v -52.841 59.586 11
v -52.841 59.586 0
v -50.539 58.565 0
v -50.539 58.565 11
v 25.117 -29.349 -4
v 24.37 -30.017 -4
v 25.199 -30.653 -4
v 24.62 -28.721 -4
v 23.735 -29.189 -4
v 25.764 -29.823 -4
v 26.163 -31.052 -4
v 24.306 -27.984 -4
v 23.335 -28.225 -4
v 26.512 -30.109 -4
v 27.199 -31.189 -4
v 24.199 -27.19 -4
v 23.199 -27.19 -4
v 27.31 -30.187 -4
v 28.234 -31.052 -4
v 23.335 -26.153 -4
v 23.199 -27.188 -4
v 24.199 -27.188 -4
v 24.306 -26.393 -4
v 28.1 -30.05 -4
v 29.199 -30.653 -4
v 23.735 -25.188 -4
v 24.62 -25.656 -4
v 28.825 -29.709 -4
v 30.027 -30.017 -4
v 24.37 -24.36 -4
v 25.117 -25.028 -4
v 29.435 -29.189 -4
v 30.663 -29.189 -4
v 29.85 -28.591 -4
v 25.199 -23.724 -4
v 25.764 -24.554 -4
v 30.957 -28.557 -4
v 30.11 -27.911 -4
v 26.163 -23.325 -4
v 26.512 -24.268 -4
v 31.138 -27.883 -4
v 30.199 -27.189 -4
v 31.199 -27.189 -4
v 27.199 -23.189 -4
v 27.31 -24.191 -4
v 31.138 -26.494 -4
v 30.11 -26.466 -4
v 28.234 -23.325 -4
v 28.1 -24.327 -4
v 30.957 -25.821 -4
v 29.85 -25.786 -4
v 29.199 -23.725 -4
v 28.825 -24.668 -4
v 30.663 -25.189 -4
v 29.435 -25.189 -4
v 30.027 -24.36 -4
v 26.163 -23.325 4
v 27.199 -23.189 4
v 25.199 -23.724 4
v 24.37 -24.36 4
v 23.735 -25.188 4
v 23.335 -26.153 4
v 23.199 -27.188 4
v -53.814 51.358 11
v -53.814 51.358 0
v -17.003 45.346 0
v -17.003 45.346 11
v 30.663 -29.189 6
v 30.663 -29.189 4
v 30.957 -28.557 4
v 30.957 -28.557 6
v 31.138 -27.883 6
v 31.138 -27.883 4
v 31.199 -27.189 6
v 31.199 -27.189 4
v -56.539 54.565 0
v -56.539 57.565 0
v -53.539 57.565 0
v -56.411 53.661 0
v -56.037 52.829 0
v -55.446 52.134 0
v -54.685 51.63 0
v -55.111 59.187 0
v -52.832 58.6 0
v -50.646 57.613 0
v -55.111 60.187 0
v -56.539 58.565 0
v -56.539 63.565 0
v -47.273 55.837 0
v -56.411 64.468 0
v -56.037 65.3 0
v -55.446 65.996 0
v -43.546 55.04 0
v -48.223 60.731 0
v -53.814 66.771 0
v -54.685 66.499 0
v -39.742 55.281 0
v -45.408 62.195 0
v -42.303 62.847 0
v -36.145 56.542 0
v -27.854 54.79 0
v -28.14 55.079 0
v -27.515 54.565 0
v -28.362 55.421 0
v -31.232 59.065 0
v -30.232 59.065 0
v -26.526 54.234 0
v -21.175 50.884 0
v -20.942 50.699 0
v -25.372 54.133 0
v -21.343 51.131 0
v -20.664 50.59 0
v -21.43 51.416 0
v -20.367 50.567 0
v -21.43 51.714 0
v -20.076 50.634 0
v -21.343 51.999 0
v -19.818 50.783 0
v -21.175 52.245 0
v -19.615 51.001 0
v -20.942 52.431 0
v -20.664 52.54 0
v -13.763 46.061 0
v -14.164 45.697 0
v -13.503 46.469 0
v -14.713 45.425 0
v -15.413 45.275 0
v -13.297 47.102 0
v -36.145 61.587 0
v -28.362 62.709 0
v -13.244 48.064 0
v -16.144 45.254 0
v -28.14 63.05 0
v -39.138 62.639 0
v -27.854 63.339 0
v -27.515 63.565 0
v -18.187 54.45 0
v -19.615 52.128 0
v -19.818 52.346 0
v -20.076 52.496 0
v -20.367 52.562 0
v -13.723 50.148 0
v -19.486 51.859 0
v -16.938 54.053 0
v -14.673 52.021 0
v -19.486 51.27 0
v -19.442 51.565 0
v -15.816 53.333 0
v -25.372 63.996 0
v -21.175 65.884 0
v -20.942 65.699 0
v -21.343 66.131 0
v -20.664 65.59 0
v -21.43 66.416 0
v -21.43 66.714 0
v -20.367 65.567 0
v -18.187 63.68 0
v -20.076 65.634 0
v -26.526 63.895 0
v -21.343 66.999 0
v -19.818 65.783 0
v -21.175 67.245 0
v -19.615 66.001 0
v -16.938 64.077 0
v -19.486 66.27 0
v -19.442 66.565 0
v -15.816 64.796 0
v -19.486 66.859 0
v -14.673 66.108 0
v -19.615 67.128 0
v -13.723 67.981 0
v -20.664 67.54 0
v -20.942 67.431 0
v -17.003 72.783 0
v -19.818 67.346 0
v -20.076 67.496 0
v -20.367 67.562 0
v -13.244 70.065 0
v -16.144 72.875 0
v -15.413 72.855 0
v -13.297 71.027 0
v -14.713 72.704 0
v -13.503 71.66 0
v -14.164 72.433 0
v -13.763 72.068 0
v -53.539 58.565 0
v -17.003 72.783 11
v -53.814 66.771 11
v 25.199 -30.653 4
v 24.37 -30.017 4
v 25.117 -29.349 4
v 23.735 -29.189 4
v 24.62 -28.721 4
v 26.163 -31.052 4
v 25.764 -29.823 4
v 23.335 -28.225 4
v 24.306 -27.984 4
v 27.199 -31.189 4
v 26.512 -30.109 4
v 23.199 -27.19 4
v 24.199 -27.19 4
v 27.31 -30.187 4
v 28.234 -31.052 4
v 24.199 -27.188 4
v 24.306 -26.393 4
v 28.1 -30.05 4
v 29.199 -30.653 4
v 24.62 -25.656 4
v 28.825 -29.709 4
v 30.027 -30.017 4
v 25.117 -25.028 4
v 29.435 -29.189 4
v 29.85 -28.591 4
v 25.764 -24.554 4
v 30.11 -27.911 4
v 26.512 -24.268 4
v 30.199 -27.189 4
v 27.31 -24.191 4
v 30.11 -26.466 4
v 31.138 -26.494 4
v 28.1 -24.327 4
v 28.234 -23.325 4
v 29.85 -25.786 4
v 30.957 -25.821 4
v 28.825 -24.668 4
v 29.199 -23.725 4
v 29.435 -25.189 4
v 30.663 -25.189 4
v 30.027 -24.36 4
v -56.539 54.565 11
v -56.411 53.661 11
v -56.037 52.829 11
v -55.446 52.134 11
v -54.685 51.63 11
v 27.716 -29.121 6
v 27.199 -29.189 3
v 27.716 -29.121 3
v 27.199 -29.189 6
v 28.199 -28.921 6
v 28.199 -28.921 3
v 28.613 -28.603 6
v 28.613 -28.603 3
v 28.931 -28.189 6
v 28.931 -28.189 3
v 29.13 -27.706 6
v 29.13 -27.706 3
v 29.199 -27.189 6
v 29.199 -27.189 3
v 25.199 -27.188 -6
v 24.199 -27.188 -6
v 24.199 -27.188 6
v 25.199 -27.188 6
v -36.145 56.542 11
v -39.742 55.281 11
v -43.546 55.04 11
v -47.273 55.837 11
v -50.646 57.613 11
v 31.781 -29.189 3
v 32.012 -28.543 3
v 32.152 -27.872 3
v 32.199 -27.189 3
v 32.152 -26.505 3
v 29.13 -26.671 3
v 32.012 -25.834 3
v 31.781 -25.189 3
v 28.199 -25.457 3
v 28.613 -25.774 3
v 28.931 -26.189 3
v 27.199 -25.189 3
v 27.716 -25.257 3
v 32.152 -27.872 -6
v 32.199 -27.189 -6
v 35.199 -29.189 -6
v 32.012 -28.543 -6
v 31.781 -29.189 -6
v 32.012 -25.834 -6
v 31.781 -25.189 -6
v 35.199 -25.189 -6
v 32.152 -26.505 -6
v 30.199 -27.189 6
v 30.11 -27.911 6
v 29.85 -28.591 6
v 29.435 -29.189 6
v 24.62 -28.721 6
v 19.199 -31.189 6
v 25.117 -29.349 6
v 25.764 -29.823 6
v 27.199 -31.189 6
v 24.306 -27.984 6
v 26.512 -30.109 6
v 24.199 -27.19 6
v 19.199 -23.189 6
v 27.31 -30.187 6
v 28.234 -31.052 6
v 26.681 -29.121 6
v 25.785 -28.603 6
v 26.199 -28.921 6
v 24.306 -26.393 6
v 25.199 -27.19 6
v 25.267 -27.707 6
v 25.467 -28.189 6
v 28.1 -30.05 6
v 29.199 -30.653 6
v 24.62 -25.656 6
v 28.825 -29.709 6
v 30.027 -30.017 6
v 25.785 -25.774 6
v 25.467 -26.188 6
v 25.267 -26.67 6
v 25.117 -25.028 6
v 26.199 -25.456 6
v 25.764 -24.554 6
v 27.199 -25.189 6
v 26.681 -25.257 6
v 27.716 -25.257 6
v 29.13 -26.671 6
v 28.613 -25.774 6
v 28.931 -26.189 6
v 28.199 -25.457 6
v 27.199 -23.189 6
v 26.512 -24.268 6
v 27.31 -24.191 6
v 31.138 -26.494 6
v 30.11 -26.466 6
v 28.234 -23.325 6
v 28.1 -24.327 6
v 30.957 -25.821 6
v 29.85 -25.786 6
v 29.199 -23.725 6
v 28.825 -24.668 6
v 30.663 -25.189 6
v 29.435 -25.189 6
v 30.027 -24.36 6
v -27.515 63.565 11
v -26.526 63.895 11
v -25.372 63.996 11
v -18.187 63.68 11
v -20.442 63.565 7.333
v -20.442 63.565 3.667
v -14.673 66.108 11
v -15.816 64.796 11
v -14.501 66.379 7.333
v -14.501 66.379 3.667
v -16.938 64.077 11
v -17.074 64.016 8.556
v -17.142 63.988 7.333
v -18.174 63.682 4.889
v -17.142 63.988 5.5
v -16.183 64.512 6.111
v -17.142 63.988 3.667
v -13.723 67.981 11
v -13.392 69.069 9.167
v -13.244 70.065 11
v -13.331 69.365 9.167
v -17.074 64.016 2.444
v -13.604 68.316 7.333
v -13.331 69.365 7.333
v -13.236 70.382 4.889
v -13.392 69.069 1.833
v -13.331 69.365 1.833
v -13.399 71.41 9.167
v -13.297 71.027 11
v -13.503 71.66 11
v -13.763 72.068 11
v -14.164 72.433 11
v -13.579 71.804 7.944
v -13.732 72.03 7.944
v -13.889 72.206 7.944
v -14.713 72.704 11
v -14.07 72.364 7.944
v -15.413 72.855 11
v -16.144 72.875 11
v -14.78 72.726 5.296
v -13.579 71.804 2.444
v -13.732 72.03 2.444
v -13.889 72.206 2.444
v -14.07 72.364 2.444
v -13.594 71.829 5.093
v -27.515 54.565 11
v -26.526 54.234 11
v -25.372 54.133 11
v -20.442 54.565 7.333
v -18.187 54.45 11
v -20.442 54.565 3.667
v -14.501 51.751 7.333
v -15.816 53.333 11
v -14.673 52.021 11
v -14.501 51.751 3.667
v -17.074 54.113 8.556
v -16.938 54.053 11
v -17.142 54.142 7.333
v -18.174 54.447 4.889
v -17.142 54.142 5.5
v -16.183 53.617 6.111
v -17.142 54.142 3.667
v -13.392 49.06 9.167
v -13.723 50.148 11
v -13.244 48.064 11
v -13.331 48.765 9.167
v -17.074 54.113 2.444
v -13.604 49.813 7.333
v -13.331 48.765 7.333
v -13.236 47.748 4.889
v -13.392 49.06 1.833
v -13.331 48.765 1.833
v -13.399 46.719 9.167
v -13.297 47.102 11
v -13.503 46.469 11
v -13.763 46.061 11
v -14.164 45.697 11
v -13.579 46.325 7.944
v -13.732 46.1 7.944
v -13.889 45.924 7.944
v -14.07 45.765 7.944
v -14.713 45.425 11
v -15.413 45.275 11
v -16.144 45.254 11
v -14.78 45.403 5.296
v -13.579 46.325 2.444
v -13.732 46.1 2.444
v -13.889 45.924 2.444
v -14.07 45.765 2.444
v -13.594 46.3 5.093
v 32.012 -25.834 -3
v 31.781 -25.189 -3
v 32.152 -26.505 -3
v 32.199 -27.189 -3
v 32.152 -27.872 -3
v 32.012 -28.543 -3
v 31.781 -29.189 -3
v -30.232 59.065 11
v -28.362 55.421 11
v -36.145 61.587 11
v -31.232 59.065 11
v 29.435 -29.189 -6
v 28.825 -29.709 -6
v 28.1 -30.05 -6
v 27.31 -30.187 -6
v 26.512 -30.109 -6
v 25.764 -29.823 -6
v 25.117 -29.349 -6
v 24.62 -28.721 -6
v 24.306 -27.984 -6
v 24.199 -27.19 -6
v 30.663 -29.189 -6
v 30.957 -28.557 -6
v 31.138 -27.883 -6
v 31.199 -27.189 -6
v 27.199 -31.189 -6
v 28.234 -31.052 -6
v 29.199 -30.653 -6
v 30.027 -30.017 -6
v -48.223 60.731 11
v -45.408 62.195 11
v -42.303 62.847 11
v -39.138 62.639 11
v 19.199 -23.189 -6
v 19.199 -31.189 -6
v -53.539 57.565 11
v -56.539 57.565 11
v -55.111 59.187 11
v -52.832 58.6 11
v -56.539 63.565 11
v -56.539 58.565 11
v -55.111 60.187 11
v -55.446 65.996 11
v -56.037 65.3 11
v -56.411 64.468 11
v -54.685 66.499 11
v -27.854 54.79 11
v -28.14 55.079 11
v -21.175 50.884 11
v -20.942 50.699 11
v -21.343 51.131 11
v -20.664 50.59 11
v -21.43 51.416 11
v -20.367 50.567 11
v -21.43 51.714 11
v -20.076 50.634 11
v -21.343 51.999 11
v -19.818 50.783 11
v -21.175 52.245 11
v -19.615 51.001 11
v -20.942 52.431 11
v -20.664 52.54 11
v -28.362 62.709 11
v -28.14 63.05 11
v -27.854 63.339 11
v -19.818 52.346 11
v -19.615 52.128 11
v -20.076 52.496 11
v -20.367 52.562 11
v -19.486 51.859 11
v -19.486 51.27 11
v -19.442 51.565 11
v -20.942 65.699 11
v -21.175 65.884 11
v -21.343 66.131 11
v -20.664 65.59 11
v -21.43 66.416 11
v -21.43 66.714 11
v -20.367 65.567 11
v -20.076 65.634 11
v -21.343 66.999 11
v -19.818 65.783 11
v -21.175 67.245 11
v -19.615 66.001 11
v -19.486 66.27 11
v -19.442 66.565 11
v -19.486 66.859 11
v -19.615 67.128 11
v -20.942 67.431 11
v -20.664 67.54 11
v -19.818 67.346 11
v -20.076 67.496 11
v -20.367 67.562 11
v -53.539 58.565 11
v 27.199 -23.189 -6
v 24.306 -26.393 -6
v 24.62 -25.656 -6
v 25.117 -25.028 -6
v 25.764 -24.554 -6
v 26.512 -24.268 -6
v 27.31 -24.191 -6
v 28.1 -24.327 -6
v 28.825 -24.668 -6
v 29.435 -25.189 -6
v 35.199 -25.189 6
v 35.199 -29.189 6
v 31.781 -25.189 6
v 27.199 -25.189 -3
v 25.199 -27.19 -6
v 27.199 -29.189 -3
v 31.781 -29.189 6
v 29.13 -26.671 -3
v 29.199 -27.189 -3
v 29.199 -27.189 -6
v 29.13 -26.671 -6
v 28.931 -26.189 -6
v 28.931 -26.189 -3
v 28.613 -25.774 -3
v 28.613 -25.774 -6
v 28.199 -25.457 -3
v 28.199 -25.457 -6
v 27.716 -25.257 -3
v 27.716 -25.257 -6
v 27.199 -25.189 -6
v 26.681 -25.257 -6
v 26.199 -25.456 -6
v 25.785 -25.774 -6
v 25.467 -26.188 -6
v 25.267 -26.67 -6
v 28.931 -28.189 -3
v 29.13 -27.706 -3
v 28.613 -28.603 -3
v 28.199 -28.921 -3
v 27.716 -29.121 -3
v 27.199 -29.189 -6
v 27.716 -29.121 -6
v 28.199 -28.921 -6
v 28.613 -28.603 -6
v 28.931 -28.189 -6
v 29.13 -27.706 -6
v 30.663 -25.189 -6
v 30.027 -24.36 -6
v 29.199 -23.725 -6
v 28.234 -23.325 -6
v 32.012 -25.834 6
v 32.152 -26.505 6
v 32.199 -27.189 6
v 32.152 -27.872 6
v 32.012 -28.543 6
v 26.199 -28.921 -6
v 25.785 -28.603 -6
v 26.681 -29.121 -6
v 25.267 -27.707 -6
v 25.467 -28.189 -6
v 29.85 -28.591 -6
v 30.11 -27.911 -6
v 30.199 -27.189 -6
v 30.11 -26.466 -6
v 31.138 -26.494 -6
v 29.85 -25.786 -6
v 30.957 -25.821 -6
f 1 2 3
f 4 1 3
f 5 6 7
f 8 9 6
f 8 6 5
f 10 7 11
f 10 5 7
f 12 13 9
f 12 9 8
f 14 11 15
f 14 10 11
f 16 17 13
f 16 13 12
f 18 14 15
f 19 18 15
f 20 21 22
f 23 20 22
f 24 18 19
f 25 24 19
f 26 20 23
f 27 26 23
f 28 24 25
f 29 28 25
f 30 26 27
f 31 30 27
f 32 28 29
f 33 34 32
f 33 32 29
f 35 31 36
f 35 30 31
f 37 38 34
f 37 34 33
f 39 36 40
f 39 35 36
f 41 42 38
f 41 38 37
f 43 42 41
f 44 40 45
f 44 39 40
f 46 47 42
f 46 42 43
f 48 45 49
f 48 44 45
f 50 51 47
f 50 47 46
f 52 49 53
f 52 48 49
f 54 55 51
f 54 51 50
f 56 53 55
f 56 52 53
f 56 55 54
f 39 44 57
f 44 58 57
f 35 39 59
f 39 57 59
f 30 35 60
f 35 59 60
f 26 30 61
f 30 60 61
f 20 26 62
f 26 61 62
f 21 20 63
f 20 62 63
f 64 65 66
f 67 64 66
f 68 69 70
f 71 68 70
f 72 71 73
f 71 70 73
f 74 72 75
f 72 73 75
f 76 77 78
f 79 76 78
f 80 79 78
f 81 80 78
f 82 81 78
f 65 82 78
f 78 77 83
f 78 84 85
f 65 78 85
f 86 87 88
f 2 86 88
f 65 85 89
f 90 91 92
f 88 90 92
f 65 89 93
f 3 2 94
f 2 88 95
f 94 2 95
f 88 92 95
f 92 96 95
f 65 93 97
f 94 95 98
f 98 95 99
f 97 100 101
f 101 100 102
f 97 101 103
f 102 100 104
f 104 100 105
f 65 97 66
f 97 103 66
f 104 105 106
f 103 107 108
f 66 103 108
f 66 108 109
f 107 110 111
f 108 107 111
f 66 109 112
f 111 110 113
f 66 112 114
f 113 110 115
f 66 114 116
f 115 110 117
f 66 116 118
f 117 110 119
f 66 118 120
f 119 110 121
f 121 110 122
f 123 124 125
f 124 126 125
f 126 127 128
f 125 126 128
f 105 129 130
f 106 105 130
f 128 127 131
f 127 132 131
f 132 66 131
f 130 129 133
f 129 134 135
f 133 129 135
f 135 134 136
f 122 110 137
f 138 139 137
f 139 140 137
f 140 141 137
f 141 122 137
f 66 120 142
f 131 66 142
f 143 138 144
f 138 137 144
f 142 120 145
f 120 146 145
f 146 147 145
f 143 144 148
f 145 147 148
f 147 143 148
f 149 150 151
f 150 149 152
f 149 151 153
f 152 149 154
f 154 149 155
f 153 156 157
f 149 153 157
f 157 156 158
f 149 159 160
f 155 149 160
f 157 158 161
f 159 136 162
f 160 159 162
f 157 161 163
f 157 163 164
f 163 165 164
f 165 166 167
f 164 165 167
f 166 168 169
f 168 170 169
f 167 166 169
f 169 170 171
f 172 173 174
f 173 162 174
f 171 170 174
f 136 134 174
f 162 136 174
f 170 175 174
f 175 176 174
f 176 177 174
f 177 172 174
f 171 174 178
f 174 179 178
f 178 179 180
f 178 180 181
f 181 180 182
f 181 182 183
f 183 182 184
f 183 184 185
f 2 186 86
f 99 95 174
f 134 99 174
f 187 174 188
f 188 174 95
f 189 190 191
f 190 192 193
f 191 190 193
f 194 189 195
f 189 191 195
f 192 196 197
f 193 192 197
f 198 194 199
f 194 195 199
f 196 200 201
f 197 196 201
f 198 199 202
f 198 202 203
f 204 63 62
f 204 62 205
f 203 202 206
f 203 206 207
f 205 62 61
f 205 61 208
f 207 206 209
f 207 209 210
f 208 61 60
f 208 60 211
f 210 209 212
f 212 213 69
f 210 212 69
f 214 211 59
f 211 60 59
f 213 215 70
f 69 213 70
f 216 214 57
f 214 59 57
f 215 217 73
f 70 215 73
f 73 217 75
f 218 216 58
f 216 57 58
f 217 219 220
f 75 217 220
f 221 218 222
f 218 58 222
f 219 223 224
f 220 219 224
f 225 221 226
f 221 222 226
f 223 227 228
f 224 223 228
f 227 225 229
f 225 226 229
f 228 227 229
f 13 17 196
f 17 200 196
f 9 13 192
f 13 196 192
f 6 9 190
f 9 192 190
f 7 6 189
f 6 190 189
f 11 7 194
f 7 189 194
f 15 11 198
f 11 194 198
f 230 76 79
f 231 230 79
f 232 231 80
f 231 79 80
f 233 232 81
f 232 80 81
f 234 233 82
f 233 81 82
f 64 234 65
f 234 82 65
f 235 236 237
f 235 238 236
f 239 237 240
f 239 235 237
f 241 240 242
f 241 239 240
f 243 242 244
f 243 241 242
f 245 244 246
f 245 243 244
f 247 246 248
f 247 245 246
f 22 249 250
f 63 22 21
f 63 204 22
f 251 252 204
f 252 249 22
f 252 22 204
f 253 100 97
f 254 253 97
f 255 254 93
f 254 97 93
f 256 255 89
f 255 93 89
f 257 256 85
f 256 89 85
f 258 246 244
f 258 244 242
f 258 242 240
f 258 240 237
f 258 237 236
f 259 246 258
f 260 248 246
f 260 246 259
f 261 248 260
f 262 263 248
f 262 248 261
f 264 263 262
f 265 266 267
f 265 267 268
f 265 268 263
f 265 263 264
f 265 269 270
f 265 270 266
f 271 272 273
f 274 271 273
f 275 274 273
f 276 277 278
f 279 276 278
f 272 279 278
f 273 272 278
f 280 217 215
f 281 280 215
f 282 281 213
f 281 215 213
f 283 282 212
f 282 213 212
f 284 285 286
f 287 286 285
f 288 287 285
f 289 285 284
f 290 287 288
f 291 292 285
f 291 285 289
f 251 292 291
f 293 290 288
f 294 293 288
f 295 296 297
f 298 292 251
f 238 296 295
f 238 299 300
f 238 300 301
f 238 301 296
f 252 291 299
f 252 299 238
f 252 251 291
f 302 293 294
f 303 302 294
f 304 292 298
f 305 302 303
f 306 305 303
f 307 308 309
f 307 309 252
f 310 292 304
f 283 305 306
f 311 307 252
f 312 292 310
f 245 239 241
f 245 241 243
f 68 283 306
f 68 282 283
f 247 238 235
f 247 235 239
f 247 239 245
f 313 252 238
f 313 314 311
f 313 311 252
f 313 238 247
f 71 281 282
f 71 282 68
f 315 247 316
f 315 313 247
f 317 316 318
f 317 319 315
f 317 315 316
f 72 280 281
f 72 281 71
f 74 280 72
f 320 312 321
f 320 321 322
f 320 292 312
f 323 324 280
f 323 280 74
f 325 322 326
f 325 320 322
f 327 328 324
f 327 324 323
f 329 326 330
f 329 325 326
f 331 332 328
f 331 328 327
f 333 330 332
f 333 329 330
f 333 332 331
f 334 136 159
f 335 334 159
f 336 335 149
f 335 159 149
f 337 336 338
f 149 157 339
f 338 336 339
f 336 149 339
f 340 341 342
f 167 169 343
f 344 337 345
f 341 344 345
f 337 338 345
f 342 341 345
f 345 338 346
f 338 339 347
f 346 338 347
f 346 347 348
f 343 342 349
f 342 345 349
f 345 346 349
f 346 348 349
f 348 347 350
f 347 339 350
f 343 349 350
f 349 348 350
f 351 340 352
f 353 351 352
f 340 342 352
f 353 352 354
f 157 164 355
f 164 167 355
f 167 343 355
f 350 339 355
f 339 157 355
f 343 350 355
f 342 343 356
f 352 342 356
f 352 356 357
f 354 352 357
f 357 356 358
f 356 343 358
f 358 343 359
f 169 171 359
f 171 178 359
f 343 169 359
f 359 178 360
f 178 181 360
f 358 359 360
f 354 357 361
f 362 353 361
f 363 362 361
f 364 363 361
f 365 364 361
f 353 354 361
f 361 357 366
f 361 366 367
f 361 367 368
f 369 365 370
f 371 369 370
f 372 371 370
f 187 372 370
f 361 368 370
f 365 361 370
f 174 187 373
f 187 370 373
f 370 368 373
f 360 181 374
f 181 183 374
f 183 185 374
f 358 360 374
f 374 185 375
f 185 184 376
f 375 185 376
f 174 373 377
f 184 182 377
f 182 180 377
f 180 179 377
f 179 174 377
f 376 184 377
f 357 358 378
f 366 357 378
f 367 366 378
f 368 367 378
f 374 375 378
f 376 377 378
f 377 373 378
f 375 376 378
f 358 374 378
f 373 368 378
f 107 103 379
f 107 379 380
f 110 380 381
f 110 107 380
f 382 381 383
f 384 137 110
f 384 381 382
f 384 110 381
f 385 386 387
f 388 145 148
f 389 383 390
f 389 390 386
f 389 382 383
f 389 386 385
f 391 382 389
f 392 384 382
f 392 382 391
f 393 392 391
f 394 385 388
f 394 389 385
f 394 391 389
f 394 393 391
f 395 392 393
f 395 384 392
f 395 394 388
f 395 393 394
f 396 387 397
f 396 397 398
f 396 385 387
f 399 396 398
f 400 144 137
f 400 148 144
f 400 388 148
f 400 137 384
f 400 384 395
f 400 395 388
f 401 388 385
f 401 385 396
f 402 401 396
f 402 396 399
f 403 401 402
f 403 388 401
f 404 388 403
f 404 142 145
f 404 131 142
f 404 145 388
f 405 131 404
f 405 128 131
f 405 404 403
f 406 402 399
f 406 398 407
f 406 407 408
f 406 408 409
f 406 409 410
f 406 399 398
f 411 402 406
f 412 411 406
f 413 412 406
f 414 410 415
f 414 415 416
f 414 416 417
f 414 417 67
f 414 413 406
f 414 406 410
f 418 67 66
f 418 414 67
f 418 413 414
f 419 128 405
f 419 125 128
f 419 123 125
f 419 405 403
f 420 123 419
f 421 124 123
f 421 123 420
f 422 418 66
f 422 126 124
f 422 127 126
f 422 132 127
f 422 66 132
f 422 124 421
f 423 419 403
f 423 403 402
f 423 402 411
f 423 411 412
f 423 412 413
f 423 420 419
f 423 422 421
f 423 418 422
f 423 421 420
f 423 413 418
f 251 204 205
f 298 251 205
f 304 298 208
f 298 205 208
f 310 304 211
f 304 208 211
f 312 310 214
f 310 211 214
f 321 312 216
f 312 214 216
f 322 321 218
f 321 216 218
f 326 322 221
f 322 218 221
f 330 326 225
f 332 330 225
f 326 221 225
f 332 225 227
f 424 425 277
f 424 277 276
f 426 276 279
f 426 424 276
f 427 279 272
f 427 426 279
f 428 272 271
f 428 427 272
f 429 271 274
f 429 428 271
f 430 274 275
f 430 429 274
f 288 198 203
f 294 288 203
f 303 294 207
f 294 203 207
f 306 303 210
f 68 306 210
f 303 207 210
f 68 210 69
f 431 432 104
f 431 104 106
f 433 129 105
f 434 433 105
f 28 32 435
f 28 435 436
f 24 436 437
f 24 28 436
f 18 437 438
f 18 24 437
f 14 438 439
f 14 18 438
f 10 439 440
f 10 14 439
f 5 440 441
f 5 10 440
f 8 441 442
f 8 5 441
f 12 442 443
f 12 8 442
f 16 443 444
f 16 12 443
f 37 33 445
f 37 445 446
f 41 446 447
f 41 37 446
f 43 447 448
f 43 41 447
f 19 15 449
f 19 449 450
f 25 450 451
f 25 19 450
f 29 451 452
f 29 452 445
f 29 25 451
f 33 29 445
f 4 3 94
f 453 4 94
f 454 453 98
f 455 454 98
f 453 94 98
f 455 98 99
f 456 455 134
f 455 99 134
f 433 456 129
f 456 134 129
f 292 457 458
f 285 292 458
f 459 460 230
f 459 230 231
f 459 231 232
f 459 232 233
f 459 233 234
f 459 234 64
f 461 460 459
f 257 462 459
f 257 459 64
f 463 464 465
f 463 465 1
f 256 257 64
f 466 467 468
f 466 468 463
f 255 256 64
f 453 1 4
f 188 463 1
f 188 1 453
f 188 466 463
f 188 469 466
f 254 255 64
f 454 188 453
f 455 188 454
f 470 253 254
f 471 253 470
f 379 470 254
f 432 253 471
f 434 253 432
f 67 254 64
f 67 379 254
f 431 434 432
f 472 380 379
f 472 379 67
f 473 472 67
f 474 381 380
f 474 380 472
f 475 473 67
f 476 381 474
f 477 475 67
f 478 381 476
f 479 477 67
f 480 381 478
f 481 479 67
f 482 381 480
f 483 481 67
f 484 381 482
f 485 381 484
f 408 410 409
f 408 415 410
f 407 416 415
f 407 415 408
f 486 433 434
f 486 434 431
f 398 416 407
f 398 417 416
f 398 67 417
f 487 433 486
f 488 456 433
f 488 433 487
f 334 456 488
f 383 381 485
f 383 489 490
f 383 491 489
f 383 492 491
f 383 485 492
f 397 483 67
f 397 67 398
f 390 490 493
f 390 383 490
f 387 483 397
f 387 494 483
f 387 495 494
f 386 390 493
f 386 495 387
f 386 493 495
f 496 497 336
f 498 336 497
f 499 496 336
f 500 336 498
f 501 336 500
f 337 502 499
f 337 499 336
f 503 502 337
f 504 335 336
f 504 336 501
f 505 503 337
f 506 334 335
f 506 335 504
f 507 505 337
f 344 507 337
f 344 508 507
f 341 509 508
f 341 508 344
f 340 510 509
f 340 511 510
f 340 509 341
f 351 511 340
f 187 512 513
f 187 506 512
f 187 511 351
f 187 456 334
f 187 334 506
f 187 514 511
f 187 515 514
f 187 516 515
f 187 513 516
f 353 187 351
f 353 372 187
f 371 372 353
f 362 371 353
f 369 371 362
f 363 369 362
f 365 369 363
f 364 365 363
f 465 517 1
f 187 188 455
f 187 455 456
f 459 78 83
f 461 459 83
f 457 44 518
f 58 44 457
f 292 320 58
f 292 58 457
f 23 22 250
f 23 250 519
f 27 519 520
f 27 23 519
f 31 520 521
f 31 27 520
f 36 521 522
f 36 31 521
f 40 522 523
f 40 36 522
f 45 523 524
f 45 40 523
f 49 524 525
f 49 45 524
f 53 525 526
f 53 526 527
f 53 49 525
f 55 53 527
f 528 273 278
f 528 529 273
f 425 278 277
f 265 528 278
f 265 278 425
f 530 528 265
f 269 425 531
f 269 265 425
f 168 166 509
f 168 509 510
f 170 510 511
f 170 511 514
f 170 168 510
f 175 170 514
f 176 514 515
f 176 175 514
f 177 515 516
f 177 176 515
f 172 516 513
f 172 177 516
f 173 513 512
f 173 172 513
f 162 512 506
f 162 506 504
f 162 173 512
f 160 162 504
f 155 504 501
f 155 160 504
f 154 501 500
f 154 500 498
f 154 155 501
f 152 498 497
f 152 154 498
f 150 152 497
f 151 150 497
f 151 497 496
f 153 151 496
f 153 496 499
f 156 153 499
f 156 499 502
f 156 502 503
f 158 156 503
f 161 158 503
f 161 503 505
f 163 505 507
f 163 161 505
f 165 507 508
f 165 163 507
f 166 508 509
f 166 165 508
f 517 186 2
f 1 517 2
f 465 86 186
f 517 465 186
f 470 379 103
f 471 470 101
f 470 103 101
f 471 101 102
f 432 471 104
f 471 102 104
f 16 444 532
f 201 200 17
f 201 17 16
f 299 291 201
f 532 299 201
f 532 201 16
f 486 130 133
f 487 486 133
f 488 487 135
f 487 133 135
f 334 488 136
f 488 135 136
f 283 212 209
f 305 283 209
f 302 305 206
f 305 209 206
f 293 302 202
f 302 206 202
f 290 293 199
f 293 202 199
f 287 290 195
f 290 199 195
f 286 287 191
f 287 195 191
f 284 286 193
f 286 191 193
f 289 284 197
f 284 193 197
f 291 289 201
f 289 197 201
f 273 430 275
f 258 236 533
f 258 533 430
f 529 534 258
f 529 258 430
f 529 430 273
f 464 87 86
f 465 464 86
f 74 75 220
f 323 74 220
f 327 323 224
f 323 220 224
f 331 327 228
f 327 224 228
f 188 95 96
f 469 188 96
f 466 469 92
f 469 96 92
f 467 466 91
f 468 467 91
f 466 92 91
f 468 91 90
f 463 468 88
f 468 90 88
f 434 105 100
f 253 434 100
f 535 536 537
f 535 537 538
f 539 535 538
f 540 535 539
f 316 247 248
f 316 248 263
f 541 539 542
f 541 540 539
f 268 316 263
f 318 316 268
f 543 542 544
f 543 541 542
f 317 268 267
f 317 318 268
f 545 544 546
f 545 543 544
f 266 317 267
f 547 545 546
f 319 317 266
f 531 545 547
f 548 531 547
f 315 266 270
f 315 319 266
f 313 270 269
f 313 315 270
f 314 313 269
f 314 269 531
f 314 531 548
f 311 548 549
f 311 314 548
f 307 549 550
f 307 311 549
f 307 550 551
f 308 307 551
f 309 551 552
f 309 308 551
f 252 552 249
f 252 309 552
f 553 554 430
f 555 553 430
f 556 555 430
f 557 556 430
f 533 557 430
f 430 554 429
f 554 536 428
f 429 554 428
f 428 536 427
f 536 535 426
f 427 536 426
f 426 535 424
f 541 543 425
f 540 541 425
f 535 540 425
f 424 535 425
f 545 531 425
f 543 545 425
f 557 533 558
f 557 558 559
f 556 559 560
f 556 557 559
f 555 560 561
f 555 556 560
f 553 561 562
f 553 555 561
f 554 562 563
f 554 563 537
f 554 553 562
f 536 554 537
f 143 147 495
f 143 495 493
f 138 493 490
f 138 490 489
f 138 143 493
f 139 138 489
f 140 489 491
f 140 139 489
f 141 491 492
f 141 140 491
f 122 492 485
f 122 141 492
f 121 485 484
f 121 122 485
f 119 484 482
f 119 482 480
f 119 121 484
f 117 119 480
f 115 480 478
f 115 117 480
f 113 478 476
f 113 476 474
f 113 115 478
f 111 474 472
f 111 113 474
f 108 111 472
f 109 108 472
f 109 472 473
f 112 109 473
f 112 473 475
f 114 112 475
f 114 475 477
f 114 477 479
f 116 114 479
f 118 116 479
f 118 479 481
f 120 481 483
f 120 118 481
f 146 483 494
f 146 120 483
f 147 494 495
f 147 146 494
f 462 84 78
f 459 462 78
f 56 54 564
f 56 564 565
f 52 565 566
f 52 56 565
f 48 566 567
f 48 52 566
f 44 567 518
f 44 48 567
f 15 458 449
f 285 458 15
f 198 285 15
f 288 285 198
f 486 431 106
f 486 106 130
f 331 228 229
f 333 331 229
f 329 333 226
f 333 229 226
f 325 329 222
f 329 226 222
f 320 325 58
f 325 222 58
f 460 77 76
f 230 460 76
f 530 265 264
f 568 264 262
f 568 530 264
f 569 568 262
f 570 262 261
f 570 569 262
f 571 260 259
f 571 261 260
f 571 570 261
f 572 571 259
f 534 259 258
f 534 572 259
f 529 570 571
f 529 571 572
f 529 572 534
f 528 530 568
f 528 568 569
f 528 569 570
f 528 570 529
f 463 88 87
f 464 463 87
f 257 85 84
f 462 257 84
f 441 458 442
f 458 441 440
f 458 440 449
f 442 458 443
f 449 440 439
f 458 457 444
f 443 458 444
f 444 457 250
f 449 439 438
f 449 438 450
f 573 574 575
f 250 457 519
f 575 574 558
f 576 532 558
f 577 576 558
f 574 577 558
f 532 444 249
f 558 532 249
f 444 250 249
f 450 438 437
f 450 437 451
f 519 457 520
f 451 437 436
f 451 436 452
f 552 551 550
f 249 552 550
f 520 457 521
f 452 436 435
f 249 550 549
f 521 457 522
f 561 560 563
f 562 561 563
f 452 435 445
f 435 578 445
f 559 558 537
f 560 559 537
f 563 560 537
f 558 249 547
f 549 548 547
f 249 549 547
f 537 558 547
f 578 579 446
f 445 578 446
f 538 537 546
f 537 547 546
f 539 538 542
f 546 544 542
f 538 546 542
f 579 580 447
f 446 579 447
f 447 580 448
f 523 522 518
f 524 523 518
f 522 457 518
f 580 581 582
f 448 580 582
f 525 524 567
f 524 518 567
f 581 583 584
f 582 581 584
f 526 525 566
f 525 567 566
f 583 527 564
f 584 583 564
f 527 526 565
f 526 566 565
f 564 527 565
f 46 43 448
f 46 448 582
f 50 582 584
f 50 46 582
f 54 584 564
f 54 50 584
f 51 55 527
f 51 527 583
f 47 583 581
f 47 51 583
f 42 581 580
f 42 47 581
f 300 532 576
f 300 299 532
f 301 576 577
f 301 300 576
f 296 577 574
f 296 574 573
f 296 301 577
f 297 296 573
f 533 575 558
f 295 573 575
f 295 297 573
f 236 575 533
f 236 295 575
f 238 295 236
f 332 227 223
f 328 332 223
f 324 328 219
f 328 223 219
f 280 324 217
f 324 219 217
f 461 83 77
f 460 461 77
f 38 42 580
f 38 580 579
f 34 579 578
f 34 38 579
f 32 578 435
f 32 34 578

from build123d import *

# Parameters (mm, degrees)
F0_R     = 1
F1_DEPTH = 11
F3_DEPTH = 6
F4_DEPTH = 4
F5_DEPTH = 3
F6_DEPTH = 6


# Not quite as in the source:
# - a feature names something its author has since deleted; it is built from what else it names


with BuildPart() as f1:
    # F0 (on Top) → F1 (new body)
    with BuildSketch(Plane.XY):
        with BuildLine():
            Line((-56.5394303022, 63.5646519078), (-56.5394303022, 60.5646519078))
            Line((-56.5394303022, 60.5646519078), (-56.5394303022, 58.5646519078))
            Line((-56.5394303022, 58.5646519078), (-55.1112962965, 60.1865433678))
            Line((-55.1112962965, 60.1865433678), (-53.5394303022, 58.5646519078))
            Line((-53.5394303022, 58.5646519078), (-52.8413255975, 59.585552632))
            Line((-52.8413255975, 59.585552632), (-50.5394303022, 58.5646519078))
            ThreePointArc((-50.5394303022, 58.5646519078), (-43.8778670045, 62.6266002152), (-36.1451600741, 61.5868439218))
            Line((-36.1451600741, 61.5868439218), (-31.2319873402, 59.0646519078))
            Line((-31.2319873402, 59.0646519078), (-36.1451600741, 56.5424598938))
            ThreePointArc((-36.1451600741, 56.5424598938), (-43.5460973086, 55.0399418647), (-50.6461998164, 57.612873414))
            Line((-50.6461998164, 57.612873414), (-52.831540008, 58.5998629716))
            Line((-52.831540008, 58.5998629716), (-53.5394303022, 57.5646519078))
            Line((-53.5394303022, 57.5646519078), (-55.1112962965, 59.1865433678))
            Line((-55.1112962965, 59.1865433678), (-56.5394303022, 57.5646519078))
            Line((-56.5394303022, 57.5646519078), (-56.5394303022, 54.5646519078))
            ThreePointArc((-56.5394303022, 54.5646519078), (-55.7660672354, 52.4605684374), (-53.8141510367, 51.3581706702))
            Line((-53.8141510367, 51.3581706702), (-17.0027786636, 45.3461106944))
            add(Edge.make_bspline(
                [(-27.5149940739, 54.5646519078), (-25.8077646027, 53.6646211006), (-20.1492133777, 55.1651591419), (-13.9447941806, 53.7805000119), (-11.9302922568, 44.5176685435), (-17.0027786636, 45.3461106944)],
                knots=[0, 0, 0, 0, 0.3389884786, 0.6657804562, 1, 1, 1, 1], degree=3))
            ThreePointArc((-27.5149940739, 54.5646519078), (-28.0042315995, 54.9274057779), (-28.3616043344, 55.4205877474))
            Line((-28.3616043344, 55.4205877474), (-30.2319873402, 59.0646519078))
            Line((-30.2319873402, 59.0646519078), (-28.3616043344, 62.7087160682))
            ThreePointArc((-28.3616043344, 62.7087160682), (-28.0042315995, 63.2018980376), (-27.5149940739, 63.5646519078))
            add(Edge.make_bspline(
                [(-27.5149940739, 63.5646519078), (-25.8077646027, 64.464682715), (-20.1492133777, 62.9641446737), (-13.9447941806, 64.3488038037), (-11.9302922568, 73.6116352721), (-17.0027786636, 72.7831931212)],
                knots=[0, 0, 0, 0, 0.3389884786, 0.6657804562, 1, 1, 1, 1], degree=3))
            Line((-17.0027786636, 72.7831931212), (-53.8141510367, 66.7711331454))
            ThreePointArc((-53.8141510367, 66.7711331454), (-55.7660672354, 65.6687353782), (-56.5394303022, 63.5646519078))
        make_face()
        with Locations((-20.4416182045, 51.5646519078)):
            Circle(F0_R, mode=Mode.SUBTRACT)
        with Locations((-20.4416182045, 66.5646519078)):
            Circle(F0_R, mode=Mode.SUBTRACT)
    extrude(amount=F1_DEPTH)


with BuildPart() as f3:
    # F2 (on Top) → F3 (new body, symmetric)
    with BuildSketch(Plane.XY):
        with BuildLine():
            ThreePointArc((27.1985391751, -29.1886593086), (28.6127527375, -28.602872871), (29.1985391751, -27.1886593086))
            ThreePointArc((29.1985391751, -27.1886593086), (28.6127527375, -25.7744457462), (27.1985391751, -25.1886593086))
            ThreePointArc((27.1985391751, -25.1886593086), (25.7846792103, -25.774092237), (25.1985394251, -27.1876593086))
            ThreePointArc((25.1985394251, -27.1876593086), (25.1985391751, -27.1886593086), (25.1985394251, -27.1896593086))
            ThreePointArc((25.1985394251, -27.1896593086), (25.7846792103, -28.6032263802), (27.1985391751, -29.1886593086))
        make_face()
        with BuildLine():
            ThreePointArc((25.1985394251, -27.1896593086), (25.1985391751, -27.1886593086), (25.1985394251, -27.1876593086))
            Line((25.1985394251, -27.1876593086), (24.1985393418, -27.1876593086))
            ThreePointArc((24.1985393418, -27.1876593086), (24.1985391751, -27.1886593086), (24.1985393418, -27.1896593086))
            Line((24.1985393418, -27.1896593086), (25.1985394251, -27.1896593086))
        make_face()
        with BuildLine():
            Line((30.6626407902, -25.1886593086), (29.4346071526, -25.1886593086))
            ThreePointArc((29.4346071526, -25.1886593086), (30.001056252, -26.1181930393), (30.1985391751, -27.1886593086))
            ThreePointArc((30.1985391751, -27.1886593086), (30.001056252, -28.2591255779), (29.4346071526, -29.1886593086))
            Line((29.4346071526, -29.1886593086), (30.6626407902, -29.1886593086))
            ThreePointArc((30.6626407902, -29.1886593086), (31.0622424802, -28.223935489), (31.1985391751, -27.1886593086))
            ThreePointArc((31.1985391751, -27.1886593086), (31.0622424802, -26.1533831282), (30.6626407902, -25.1886593086))
        make_face()
        with BuildLine():
            ThreePointArc((24.1985393418, -27.1876593086), (26.1285400068, -24.3859638596), (29.4346071526, -25.1886593086))
            Line((29.4346071526, -25.1886593086), (30.6626407902, -25.1886593086))
            ThreePointArc((30.6626407902, -25.1886593086), (29.1985391751, -23.7245576935), (27.1985391751, -23.1886593086))
            ThreePointArc((27.1985391751, -23.1886593086), (24.3704656258, -24.3598786525), (23.1985393001, -27.1876593086))
            Line((23.1985393001, -27.1876593086), (24.1985393418, -27.1876593086))
        make_face()
        with BuildLine():
            Line((30.6626407902, -29.1886593086), (29.4346071526, -29.1886593086))
            ThreePointArc((29.4346071526, -29.1886593086), (26.1285400068, -29.9913547576), (24.1985393418, -27.1896593086))
            Line((24.1985393418, -27.1896593086), (23.1985393001, -27.1896593086))
            ThreePointArc((23.1985393001, -27.1896593086), (24.3704656258, -30.0174399646), (27.1985391751, -31.1886593086))
            ThreePointArc((27.1985391751, -31.1886593086), (29.1985391751, -30.6527609237), (30.6626407902, -29.1886593086))
        make_face()
        with BuildLine():
            ThreePointArc((24.1985393418, -27.1896593086), (24.1985391751, -27.1886593086), (24.1985393418, -27.1876593086))
            Line((24.1985393418, -27.1876593086), (23.1985393001, -27.1876593086))
            ThreePointArc((23.1985393001, -27.1876593086), (23.1985391751, -27.1886593086), (23.1985393001, -27.1896593086))
            Line((23.1985393001, -27.1896593086), (24.1985393418, -27.1896593086))
        make_face()
        with BuildLine():
            ThreePointArc((23.1985393001, -27.1896593086), (23.1985391751, -27.1886593086), (23.1985393001, -27.1876593086))
            ThreePointArc((23.1985393001, -27.1876593086), (24.3704656258, -24.3598786525), (27.1985391751, -23.1886593086))
            Line((27.1985391751, -23.1886593086), (24.1985391751, -23.1886593086))
            ThreePointArc((24.1985391751, -23.1886593086), (22.1985391751, -27.1886593086), (24.1985391751, -31.1886593086))
            Line((24.1985391751, -31.1886593086), (27.1985391751, -31.1886593086))
            ThreePointArc((27.1985391751, -31.1886593086), (24.3704656258, -30.0174399646), (23.1985393001, -27.1896593086))
        make_face()
        with BuildLine():
            ThreePointArc((24.1985391751, -31.1886593086), (22.1985391751, -27.1886593086), (24.1985391751, -23.1886593086))
            Line((24.1985391751, -23.1886593086), (19.1985391751, -23.1886593086))
            Line((19.1985391751, -23.1886593086), (19.1985391751, -31.1886593086))
            Line((19.1985391751, -31.1886593086), (24.1985391751, -31.1886593086))
        make_face()
    extrude(amount=F3_DEPTH, both=True)

    # F2 (on Top) → F4 (cut, symmetric)
    with BuildSketch(Plane.XY):
        with BuildLine():
            ThreePointArc((24.1985393418, -27.1876593086), (26.1285400068, -24.3859638596), (29.4346071526, -25.1886593086))
            Line((29.4346071526, -25.1886593086), (30.6626407902, -25.1886593086))
            ThreePointArc((30.6626407902, -25.1886593086), (29.1985391751, -23.7245576935), (27.1985391751, -23.1886593086))
            ThreePointArc((27.1985391751, -23.1886593086), (24.3704656258, -24.3598786525), (23.1985393001, -27.1876593086))
            Line((23.1985393001, -27.1876593086), (24.1985393418, -27.1876593086))
        make_face()
        with BuildLine():
            Line((30.6626407902, -25.1886593086), (29.4346071526, -25.1886593086))
            ThreePointArc((29.4346071526, -25.1886593086), (30.001056252, -26.1181930393), (30.1985391751, -27.1886593086))
            ThreePointArc((30.1985391751, -27.1886593086), (30.001056252, -28.2591255779), (29.4346071526, -29.1886593086))
            Line((29.4346071526, -29.1886593086), (30.6626407902, -29.1886593086))
            ThreePointArc((30.6626407902, -29.1886593086), (31.0622424802, -28.223935489), (31.1985391751, -27.1886593086))
            ThreePointArc((31.1985391751, -27.1886593086), (31.0622424802, -26.1533831282), (30.6626407902, -25.1886593086))
        make_face()
        with BuildLine():
            Line((30.6626407902, -29.1886593086), (29.4346071526, -29.1886593086))
            ThreePointArc((29.4346071526, -29.1886593086), (26.1285400068, -29.9913547576), (24.1985393418, -27.1896593086))
            Line((24.1985393418, -27.1896593086), (23.1985393001, -27.1896593086))
            ThreePointArc((23.1985393001, -27.1896593086), (24.3704656258, -30.0174399646), (27.1985391751, -31.1886593086))
            ThreePointArc((27.1985391751, -31.1886593086), (29.1985391751, -30.6527609237), (30.6626407902, -29.1886593086))
        make_face()
    extrude(amount=F4_DEPTH, both=True, mode=Mode.SUBTRACT)

    # F2 (on Top) → F5 (join, symmetric)
    with BuildSketch(Plane.XY):
        with BuildLine():
            ThreePointArc((27.1985391751, -25.1886593086), (28.6127527375, -25.7744457462), (29.1985391751, -27.1886593086))
            ThreePointArc((29.1985391751, -27.1886593086), (28.6127527375, -28.602872871), (27.1985391751, -29.1886593086))
            Line((27.1985391751, -29.1886593086), (29.4346071526, -29.1886593086))
            ThreePointArc((29.4346071526, -29.1886593086), (30.001056252, -28.2591255779), (30.1985391751, -27.1886593086))
            ThreePointArc((30.1985391751, -27.1886593086), (30.001056252, -26.1181930393), (29.4346071526, -25.1886593086))
            Line((29.4346071526, -25.1886593086), (27.1985391751, -25.1886593086))
        make_face()
        with BuildLine():
            Line((31.78111487, -25.1886593086), (30.6626407902, -25.1886593086))
            ThreePointArc((30.6626407902, -25.1886593086), (31.0622424802, -26.1533831282), (31.1985391751, -27.1886593086))
            ThreePointArc((31.1985391751, -27.1886593086), (31.0622424802, -28.223935489), (30.6626407902, -29.1886593086))
            Line((30.6626407902, -29.1886593086), (31.78111487, -29.1886593086))
            ThreePointArc((31.78111487, -29.1886593086), (32.0930707397, -28.210207527), (32.1985391751, -27.1886593086))
            ThreePointArc((32.1985391751, -27.1886593086), (32.0930707397, -26.1671110901), (31.78111487, -25.1886593086))
        make_face()
        with BuildLine():
            Line((30.6626407902, -25.1886593086), (29.4346071526, -25.1886593086))
            ThreePointArc((29.4346071526, -25.1886593086), (30.001056252, -26.1181930393), (30.1985391751, -27.1886593086))
            ThreePointArc((30.1985391751, -27.1886593086), (30.001056252, -28.2591255779), (29.4346071526, -29.1886593086))
            Line((29.4346071526, -29.1886593086), (30.6626407902, -29.1886593086))
            ThreePointArc((30.6626407902, -29.1886593086), (31.0622424802, -28.223935489), (31.1985391751, -27.1886593086))
            ThreePointArc((31.1985391751, -27.1886593086), (31.0622424802, -26.1533831282), (30.6626407902, -25.1886593086))
        make_face()
    extrude(amount=F5_DEPTH, both=True)

    # F2 (on Top) → F6 (join, symmetric)
    with BuildSketch(Plane.XY):
        with BuildLine():
            Line((35.1985391751, -25.1886593086), (31.78111487, -25.1886593086))
            ThreePointArc((31.78111487, -25.1886593086), (32.0930707397, -26.1671110901), (32.1985391751, -27.1886593086))
            ThreePointArc((32.1985391751, -27.1886593086), (32.0930707397, -28.210207527), (31.78111487, -29.1886593086))
            Line((31.78111487, -29.1886593086), (35.1985391751, -29.1886593086))
            Line((35.1985391751, -29.1886593086), (35.1985391751, -25.1886593086))
        make_face()
    extrude(amount=F6_DEPTH, both=True)


solid = Compound([f1.part, f3.part])
